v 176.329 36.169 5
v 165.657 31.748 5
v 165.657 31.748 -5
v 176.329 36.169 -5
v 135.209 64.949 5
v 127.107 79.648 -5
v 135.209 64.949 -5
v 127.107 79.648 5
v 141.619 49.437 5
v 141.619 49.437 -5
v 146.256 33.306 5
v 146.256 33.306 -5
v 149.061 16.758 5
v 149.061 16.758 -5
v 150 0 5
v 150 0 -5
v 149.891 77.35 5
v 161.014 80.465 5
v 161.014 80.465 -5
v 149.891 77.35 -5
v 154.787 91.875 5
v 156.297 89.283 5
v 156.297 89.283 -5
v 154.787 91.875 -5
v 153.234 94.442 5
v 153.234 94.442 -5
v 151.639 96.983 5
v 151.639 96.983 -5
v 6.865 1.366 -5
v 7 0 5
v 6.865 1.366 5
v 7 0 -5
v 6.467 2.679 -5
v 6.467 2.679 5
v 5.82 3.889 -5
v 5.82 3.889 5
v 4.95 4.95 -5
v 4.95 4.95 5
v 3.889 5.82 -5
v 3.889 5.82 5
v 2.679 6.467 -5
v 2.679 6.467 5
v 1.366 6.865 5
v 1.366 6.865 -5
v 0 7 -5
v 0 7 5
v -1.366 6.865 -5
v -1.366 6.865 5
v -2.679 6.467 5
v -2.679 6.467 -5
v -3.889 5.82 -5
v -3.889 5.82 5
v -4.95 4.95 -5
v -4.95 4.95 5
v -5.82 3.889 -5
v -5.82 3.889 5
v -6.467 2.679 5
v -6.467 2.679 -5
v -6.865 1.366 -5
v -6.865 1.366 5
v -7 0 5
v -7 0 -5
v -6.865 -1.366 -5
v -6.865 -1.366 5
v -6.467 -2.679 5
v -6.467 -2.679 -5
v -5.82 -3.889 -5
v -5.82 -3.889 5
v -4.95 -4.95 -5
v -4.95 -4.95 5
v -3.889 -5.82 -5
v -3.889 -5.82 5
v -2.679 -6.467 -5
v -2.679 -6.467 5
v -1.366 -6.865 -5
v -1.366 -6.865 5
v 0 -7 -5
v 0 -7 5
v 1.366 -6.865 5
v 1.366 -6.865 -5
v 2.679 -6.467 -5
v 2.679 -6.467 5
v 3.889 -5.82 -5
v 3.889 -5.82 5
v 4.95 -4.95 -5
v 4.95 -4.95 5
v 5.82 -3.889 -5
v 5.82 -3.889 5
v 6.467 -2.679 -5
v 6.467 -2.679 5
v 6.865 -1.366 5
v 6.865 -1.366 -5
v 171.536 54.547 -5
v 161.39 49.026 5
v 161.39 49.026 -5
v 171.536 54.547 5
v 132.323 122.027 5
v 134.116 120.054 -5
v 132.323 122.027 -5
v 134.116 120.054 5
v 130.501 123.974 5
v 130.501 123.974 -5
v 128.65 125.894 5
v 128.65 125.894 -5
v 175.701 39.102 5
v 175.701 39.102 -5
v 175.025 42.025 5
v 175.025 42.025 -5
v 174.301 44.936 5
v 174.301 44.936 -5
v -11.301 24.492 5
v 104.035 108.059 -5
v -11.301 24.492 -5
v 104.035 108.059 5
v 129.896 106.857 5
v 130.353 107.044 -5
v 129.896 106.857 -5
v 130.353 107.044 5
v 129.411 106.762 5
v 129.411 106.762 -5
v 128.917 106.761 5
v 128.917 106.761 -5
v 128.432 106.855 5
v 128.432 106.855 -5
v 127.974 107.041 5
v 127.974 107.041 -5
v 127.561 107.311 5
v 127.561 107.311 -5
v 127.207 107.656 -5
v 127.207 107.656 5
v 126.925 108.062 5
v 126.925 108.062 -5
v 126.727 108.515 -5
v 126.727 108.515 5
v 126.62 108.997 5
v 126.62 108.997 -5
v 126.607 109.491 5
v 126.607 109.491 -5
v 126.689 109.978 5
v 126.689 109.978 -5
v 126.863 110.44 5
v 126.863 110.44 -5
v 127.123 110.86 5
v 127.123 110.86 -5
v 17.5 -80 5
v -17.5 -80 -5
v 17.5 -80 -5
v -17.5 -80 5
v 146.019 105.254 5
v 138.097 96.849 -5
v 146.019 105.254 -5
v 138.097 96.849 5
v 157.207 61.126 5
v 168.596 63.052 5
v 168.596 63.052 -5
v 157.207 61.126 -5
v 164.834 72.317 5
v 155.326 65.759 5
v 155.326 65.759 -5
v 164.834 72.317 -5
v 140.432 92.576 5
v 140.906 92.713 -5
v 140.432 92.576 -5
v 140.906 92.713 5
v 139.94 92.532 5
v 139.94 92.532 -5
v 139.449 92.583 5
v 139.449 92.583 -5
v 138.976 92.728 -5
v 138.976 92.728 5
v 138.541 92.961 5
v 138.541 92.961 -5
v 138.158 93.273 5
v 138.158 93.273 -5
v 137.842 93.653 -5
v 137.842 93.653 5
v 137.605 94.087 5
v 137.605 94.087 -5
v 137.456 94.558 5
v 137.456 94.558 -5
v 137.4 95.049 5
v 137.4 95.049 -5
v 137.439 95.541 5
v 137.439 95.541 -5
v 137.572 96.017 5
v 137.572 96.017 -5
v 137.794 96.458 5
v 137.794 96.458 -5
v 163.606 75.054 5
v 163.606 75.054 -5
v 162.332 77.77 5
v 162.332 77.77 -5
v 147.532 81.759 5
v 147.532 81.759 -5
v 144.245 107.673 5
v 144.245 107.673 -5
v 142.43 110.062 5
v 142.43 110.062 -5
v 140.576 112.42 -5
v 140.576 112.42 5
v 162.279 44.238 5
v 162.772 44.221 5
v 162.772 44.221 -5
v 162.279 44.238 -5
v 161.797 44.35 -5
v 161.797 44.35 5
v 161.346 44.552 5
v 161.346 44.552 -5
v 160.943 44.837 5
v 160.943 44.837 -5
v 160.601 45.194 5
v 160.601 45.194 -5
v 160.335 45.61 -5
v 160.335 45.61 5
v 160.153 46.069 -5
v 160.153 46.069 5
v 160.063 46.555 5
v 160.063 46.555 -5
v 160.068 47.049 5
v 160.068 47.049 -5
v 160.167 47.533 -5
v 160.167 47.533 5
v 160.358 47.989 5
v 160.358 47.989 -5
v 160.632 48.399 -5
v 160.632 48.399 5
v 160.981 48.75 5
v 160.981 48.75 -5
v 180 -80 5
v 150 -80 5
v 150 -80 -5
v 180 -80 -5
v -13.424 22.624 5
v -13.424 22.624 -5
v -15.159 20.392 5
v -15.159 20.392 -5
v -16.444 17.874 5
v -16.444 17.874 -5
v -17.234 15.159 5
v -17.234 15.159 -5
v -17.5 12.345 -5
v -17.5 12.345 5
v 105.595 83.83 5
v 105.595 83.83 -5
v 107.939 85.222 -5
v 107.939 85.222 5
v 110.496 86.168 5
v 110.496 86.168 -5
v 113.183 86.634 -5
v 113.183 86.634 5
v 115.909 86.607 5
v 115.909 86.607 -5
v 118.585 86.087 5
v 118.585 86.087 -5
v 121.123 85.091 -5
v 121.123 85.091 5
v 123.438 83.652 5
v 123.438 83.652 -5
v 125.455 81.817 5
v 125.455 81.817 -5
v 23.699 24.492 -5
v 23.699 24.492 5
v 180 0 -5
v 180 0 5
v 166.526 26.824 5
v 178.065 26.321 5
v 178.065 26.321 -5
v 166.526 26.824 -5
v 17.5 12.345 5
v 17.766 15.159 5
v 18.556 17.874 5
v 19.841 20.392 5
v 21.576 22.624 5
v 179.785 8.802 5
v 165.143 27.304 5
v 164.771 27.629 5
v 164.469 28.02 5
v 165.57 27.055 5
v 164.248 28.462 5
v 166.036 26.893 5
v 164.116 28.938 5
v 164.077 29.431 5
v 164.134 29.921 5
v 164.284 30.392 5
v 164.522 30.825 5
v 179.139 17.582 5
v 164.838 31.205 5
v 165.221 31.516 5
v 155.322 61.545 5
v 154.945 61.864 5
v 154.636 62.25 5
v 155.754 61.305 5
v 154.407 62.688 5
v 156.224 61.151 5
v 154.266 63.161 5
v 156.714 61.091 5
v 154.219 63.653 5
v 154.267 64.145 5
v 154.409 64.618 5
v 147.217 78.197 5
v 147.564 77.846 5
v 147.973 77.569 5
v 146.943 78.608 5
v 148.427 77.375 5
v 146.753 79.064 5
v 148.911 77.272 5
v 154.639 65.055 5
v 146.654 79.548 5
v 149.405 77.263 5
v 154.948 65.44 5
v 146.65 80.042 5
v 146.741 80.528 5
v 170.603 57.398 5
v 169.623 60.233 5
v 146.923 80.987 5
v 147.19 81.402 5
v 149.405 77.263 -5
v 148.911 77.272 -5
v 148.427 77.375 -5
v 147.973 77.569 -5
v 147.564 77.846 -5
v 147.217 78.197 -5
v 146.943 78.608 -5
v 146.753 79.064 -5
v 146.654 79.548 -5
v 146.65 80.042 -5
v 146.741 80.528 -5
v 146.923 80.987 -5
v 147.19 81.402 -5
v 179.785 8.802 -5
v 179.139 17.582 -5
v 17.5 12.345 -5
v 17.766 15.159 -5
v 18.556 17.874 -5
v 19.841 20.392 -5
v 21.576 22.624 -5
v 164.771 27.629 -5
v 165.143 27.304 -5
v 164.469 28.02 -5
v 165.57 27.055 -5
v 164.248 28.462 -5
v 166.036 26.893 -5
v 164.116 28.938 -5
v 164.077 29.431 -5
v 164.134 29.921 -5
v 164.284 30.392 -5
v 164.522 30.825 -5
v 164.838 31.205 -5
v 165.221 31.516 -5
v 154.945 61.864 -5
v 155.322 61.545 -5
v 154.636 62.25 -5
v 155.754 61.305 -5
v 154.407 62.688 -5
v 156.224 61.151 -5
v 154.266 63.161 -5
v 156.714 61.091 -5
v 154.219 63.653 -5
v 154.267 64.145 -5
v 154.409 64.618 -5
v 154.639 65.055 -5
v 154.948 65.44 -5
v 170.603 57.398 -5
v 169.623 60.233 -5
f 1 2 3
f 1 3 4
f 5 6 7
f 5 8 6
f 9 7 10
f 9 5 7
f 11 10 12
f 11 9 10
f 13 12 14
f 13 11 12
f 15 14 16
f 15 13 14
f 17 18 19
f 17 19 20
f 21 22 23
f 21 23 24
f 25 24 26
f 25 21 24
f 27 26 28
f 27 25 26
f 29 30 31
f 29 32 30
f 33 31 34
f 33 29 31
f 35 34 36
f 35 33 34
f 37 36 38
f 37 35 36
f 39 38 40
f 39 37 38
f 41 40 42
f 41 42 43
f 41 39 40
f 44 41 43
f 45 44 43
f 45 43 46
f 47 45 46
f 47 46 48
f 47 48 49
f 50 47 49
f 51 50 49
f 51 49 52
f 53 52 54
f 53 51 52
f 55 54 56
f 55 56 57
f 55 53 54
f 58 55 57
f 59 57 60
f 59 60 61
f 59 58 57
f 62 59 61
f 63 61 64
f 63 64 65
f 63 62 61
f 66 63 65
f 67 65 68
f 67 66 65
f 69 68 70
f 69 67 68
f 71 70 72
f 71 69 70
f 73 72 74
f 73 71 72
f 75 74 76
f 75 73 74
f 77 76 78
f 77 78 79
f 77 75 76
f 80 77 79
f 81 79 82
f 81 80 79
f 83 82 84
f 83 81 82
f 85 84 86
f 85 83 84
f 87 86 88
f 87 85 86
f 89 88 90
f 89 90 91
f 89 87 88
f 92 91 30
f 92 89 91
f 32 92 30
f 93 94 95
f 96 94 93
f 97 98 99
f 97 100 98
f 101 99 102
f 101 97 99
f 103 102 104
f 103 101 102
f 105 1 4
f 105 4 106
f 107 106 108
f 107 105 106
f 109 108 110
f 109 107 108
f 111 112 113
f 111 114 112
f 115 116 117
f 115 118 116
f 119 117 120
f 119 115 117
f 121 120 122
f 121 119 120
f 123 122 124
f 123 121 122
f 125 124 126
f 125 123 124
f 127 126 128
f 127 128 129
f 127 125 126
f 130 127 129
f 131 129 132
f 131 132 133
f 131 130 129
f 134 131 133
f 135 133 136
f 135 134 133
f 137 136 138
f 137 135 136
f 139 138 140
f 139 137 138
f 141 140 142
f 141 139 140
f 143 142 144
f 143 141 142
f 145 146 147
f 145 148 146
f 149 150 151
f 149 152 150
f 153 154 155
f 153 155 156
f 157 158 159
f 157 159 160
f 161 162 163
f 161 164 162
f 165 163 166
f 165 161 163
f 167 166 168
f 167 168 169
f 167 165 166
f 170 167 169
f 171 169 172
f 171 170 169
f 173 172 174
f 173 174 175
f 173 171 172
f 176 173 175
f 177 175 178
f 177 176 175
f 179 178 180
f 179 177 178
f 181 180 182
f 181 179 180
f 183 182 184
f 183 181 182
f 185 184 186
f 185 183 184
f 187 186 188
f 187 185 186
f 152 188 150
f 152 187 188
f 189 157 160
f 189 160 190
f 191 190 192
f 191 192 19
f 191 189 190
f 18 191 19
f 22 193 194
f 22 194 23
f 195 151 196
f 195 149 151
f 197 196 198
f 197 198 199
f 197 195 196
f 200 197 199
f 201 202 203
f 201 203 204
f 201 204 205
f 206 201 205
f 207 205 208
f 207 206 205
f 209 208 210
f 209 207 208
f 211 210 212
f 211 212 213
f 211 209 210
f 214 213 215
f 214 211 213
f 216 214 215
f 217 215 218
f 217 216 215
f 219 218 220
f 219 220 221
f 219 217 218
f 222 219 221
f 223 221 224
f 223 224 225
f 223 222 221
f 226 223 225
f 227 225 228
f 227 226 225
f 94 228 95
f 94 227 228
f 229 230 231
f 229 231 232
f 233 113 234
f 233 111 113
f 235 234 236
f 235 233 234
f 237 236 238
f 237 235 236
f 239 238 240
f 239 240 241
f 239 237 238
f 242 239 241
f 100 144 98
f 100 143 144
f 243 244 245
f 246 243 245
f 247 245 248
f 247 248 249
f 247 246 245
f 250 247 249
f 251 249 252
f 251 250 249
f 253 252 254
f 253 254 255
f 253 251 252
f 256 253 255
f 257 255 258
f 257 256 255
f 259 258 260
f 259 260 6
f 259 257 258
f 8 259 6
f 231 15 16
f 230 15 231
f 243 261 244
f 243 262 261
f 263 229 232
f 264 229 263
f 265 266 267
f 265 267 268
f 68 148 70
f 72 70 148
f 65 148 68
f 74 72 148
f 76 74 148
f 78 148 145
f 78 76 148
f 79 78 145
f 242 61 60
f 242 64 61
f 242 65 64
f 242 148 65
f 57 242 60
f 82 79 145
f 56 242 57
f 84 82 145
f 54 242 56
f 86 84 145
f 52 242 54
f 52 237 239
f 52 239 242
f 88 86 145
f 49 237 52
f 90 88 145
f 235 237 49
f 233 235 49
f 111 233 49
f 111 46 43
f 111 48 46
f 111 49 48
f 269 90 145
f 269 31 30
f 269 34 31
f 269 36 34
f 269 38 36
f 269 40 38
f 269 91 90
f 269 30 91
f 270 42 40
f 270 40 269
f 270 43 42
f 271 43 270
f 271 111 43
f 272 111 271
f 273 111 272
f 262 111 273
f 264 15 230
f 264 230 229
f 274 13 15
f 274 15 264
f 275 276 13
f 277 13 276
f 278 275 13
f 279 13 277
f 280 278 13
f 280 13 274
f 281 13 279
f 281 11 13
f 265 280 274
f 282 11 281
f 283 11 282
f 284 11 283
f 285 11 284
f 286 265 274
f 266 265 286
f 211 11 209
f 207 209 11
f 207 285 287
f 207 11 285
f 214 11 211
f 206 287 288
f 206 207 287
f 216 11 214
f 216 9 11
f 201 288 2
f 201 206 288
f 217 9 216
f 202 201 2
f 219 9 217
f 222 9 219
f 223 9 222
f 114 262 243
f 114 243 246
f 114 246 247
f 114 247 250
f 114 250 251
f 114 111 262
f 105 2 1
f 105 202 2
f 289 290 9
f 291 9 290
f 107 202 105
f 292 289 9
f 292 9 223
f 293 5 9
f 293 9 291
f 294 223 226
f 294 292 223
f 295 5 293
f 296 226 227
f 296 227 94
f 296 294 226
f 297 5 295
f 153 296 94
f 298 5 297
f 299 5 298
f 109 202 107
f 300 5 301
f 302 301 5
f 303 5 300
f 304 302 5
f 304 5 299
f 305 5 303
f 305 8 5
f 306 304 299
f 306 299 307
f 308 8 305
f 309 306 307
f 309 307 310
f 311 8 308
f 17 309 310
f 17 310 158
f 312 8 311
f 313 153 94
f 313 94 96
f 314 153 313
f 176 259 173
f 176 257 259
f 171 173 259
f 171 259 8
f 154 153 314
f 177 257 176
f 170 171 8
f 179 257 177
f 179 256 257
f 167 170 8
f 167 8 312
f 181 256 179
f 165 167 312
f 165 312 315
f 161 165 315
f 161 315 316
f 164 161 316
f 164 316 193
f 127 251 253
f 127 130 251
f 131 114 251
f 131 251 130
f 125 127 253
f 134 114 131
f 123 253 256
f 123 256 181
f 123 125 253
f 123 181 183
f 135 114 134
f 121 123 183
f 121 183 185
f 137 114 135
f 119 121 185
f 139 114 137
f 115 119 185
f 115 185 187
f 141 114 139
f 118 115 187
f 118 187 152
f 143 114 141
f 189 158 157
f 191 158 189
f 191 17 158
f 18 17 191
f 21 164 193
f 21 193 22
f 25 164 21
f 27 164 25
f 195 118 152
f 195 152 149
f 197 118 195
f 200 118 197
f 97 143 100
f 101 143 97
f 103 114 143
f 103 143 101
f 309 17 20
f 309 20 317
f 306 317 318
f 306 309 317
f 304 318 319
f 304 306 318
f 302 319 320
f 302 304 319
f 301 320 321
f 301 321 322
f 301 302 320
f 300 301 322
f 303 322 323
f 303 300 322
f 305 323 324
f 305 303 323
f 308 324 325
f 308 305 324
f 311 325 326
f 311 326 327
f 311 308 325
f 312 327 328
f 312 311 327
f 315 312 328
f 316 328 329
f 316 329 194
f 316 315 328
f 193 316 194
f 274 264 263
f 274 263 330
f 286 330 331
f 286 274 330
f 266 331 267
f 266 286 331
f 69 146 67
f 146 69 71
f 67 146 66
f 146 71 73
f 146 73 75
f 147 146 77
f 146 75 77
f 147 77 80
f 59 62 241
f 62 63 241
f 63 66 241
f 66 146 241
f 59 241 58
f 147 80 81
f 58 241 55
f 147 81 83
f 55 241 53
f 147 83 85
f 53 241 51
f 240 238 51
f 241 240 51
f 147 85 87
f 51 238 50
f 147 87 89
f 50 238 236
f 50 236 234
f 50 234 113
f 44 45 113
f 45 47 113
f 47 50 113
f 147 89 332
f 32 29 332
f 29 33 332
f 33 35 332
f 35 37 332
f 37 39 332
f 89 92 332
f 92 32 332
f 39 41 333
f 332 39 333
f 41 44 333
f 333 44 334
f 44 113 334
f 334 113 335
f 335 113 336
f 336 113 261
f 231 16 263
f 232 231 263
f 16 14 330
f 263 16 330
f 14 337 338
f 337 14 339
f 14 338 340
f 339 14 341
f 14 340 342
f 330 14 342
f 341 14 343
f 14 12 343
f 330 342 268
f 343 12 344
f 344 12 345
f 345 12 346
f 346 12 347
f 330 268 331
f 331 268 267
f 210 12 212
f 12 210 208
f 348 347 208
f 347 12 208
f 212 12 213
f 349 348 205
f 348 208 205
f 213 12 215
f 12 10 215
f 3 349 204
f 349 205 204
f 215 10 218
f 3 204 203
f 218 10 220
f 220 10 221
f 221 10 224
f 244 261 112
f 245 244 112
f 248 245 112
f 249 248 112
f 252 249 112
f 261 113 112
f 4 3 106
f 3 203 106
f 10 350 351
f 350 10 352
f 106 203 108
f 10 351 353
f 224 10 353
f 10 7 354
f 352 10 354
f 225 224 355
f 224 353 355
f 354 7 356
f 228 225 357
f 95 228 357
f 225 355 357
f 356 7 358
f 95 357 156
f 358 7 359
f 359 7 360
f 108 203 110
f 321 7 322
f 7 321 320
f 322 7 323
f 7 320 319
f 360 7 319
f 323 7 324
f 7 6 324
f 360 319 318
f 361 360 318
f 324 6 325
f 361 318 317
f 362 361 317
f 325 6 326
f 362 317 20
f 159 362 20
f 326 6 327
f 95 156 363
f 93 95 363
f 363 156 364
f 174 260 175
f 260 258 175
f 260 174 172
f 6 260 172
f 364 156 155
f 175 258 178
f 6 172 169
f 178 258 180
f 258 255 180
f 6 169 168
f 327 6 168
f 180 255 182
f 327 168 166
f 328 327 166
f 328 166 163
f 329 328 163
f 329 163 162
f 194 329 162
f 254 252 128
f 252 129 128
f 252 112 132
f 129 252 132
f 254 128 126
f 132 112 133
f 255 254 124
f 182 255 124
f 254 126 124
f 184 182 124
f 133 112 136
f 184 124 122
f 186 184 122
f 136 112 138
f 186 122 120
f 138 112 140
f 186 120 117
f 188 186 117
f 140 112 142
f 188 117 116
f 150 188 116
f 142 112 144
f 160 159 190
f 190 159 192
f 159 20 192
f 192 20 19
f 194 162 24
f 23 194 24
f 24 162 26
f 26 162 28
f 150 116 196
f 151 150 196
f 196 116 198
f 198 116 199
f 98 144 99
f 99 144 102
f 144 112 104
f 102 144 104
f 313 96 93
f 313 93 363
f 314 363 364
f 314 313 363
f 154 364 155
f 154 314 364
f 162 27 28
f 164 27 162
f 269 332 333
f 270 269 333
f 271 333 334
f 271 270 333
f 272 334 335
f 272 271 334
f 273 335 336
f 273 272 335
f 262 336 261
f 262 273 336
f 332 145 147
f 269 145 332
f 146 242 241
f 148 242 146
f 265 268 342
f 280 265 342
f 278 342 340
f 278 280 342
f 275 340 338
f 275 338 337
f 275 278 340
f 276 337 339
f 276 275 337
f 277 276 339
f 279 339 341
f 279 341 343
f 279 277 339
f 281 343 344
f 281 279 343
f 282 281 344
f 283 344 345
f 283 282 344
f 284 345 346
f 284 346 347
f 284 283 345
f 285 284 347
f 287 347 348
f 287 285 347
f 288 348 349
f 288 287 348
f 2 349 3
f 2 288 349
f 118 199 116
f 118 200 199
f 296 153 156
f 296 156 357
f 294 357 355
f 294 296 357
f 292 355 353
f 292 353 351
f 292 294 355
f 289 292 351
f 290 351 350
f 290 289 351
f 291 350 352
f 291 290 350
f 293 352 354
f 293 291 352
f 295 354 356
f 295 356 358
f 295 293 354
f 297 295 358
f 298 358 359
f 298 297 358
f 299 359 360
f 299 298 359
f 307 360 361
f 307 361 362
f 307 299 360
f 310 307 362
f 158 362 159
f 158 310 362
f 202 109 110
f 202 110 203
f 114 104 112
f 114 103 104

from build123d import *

# Parameters (mm, degrees)
ESQUISSE1_R        = 7
BOSS_EXTRU_2_DEPTH = 5


with BuildPart() as part:
    # Esquisse1 → Boss.-Extru.2 (new body, symmetric)
    with BuildSketch(Plane.XY):
        with BuildLine():
            Line((150, 0), (150, -80))
            Line((150, -80), (180, -80))
            Line((180, -80), (180, 0))
            ThreePointArc((180, 0), (179.515656817, 13.195793174), (178.065233806, 26.320571987))
            Line((178.065233806, 26.320571987), (166.525661597, 26.82440059))
            ThreePointArc((166.525661597, 26.82440059), (164.115561692, 28.93800148), (165.657420708, 31.748439355))
            Line((165.657420708, 31.748439355), (176.328752029, 36.168649517))
            ThreePointArc((176.328752029, 36.168649517), (175.369530112, 40.565107028), (174.300707948, 44.936212668))
            Line((174.300707948, 44.936212668), (162.772284789, 44.221349389))
            ThreePointArc((162.772284789, 44.221349389), (160.152897605, 46.069240364), (161.390047035, 49.026494422))
            Line((161.390047035, 49.026494422), (171.536232439, 54.546502735))
            ThreePointArc((171.536232439, 54.546502735), (170.119109634, 58.817416956), (168.595667923, 63.051572207))
            Line((168.595667923, 63.051572207), (157.206741362, 61.125975718))
            ThreePointArc((157.206741362, 61.125975718), (154.407228903, 62.687583949), (155.325895389, 65.758730667))
            Line((155.325895389, 65.758730667), (164.833975975, 72.317082106))
            ThreePointArc((164.833975975, 72.317082106), (162.974729307, 76.414904352), (161.013628739, 80.464969771))
            Line((161.013628739, 80.464969771), (149.89099329, 77.350078007))
            ThreePointArc((149.89099329, 77.350078007), (146.94252292, 78.608017892), (147.532478818, 81.758865764))
            Line((147.532478818, 81.758865764), (156.296599795, 89.282545285))
            ThreePointArc((156.296599795, 89.282545285), (154.015928519, 93.161653928), (151.6390023, 96.98253957))
            Line((151.6390023, 96.98253957), (140.906487819, 92.713031056))
            ThreePointArc((140.906487819, 92.713031056), (137.841885271, 93.653297773), (138.09656252, 96.84876797))
            Line((138.09656252, 96.84876797), (146.019151703, 105.254013396))
            ThreePointArc((146.019151703, 105.254013396), (143.34244685, 108.871221776), (140.576157634, 112.420389187))
            Line((140.576157634, 112.420389187), (130.353250706, 107.04379696))
            ThreePointArc((130.353250706, 107.04379696), (127.206634629, 107.655922389), (127.123197872, 110.860439292))
            Line((127.123197872, 110.860439292), (134.116051966, 120.053673851))
            ThreePointArc((134.116051966, 120.053673851), (131.415298407, 123.004143608), (128.649651075, 125.893873077))
            Line((128.649651075, 125.893873077), (104.03484123, 108.059020032))
            Line((104.03484123, 108.059020032), (-11.300992684, 24.491539248))
            ThreePointArc((-11.300992684, 24.491539248), (-15.86066784, 19.163375655), (-17.5, 12.344830732))
            Line((-17.5, 12.344830732), (-17.5, -80))
            Line((-17.5, -80), (17.5, -80))
            Line((17.5, -80), (17.5, 12.344830732))
            ThreePointArc((17.5, 12.344830732), (19.13933216, 19.163375655), (23.699007316, 24.491539248))
            Line((23.699007316, 24.491539248), (105.595221964, 83.83008228))
            ThreePointArc((105.595221964, 83.83008228), (117.258640826, 86.4077249), (127.106905164, 79.648193071))
            ThreePointArc((127.106905164, 79.648193071), (144.163164114, 41.436482871), (150, 0))
        make_face()
        Circle(ESQUISSE1_R, mode=Mode.SUBTRACT)
    extrude(amount=BOSS_EXTRU_2_DEPTH, both=True)


solid = part.part
